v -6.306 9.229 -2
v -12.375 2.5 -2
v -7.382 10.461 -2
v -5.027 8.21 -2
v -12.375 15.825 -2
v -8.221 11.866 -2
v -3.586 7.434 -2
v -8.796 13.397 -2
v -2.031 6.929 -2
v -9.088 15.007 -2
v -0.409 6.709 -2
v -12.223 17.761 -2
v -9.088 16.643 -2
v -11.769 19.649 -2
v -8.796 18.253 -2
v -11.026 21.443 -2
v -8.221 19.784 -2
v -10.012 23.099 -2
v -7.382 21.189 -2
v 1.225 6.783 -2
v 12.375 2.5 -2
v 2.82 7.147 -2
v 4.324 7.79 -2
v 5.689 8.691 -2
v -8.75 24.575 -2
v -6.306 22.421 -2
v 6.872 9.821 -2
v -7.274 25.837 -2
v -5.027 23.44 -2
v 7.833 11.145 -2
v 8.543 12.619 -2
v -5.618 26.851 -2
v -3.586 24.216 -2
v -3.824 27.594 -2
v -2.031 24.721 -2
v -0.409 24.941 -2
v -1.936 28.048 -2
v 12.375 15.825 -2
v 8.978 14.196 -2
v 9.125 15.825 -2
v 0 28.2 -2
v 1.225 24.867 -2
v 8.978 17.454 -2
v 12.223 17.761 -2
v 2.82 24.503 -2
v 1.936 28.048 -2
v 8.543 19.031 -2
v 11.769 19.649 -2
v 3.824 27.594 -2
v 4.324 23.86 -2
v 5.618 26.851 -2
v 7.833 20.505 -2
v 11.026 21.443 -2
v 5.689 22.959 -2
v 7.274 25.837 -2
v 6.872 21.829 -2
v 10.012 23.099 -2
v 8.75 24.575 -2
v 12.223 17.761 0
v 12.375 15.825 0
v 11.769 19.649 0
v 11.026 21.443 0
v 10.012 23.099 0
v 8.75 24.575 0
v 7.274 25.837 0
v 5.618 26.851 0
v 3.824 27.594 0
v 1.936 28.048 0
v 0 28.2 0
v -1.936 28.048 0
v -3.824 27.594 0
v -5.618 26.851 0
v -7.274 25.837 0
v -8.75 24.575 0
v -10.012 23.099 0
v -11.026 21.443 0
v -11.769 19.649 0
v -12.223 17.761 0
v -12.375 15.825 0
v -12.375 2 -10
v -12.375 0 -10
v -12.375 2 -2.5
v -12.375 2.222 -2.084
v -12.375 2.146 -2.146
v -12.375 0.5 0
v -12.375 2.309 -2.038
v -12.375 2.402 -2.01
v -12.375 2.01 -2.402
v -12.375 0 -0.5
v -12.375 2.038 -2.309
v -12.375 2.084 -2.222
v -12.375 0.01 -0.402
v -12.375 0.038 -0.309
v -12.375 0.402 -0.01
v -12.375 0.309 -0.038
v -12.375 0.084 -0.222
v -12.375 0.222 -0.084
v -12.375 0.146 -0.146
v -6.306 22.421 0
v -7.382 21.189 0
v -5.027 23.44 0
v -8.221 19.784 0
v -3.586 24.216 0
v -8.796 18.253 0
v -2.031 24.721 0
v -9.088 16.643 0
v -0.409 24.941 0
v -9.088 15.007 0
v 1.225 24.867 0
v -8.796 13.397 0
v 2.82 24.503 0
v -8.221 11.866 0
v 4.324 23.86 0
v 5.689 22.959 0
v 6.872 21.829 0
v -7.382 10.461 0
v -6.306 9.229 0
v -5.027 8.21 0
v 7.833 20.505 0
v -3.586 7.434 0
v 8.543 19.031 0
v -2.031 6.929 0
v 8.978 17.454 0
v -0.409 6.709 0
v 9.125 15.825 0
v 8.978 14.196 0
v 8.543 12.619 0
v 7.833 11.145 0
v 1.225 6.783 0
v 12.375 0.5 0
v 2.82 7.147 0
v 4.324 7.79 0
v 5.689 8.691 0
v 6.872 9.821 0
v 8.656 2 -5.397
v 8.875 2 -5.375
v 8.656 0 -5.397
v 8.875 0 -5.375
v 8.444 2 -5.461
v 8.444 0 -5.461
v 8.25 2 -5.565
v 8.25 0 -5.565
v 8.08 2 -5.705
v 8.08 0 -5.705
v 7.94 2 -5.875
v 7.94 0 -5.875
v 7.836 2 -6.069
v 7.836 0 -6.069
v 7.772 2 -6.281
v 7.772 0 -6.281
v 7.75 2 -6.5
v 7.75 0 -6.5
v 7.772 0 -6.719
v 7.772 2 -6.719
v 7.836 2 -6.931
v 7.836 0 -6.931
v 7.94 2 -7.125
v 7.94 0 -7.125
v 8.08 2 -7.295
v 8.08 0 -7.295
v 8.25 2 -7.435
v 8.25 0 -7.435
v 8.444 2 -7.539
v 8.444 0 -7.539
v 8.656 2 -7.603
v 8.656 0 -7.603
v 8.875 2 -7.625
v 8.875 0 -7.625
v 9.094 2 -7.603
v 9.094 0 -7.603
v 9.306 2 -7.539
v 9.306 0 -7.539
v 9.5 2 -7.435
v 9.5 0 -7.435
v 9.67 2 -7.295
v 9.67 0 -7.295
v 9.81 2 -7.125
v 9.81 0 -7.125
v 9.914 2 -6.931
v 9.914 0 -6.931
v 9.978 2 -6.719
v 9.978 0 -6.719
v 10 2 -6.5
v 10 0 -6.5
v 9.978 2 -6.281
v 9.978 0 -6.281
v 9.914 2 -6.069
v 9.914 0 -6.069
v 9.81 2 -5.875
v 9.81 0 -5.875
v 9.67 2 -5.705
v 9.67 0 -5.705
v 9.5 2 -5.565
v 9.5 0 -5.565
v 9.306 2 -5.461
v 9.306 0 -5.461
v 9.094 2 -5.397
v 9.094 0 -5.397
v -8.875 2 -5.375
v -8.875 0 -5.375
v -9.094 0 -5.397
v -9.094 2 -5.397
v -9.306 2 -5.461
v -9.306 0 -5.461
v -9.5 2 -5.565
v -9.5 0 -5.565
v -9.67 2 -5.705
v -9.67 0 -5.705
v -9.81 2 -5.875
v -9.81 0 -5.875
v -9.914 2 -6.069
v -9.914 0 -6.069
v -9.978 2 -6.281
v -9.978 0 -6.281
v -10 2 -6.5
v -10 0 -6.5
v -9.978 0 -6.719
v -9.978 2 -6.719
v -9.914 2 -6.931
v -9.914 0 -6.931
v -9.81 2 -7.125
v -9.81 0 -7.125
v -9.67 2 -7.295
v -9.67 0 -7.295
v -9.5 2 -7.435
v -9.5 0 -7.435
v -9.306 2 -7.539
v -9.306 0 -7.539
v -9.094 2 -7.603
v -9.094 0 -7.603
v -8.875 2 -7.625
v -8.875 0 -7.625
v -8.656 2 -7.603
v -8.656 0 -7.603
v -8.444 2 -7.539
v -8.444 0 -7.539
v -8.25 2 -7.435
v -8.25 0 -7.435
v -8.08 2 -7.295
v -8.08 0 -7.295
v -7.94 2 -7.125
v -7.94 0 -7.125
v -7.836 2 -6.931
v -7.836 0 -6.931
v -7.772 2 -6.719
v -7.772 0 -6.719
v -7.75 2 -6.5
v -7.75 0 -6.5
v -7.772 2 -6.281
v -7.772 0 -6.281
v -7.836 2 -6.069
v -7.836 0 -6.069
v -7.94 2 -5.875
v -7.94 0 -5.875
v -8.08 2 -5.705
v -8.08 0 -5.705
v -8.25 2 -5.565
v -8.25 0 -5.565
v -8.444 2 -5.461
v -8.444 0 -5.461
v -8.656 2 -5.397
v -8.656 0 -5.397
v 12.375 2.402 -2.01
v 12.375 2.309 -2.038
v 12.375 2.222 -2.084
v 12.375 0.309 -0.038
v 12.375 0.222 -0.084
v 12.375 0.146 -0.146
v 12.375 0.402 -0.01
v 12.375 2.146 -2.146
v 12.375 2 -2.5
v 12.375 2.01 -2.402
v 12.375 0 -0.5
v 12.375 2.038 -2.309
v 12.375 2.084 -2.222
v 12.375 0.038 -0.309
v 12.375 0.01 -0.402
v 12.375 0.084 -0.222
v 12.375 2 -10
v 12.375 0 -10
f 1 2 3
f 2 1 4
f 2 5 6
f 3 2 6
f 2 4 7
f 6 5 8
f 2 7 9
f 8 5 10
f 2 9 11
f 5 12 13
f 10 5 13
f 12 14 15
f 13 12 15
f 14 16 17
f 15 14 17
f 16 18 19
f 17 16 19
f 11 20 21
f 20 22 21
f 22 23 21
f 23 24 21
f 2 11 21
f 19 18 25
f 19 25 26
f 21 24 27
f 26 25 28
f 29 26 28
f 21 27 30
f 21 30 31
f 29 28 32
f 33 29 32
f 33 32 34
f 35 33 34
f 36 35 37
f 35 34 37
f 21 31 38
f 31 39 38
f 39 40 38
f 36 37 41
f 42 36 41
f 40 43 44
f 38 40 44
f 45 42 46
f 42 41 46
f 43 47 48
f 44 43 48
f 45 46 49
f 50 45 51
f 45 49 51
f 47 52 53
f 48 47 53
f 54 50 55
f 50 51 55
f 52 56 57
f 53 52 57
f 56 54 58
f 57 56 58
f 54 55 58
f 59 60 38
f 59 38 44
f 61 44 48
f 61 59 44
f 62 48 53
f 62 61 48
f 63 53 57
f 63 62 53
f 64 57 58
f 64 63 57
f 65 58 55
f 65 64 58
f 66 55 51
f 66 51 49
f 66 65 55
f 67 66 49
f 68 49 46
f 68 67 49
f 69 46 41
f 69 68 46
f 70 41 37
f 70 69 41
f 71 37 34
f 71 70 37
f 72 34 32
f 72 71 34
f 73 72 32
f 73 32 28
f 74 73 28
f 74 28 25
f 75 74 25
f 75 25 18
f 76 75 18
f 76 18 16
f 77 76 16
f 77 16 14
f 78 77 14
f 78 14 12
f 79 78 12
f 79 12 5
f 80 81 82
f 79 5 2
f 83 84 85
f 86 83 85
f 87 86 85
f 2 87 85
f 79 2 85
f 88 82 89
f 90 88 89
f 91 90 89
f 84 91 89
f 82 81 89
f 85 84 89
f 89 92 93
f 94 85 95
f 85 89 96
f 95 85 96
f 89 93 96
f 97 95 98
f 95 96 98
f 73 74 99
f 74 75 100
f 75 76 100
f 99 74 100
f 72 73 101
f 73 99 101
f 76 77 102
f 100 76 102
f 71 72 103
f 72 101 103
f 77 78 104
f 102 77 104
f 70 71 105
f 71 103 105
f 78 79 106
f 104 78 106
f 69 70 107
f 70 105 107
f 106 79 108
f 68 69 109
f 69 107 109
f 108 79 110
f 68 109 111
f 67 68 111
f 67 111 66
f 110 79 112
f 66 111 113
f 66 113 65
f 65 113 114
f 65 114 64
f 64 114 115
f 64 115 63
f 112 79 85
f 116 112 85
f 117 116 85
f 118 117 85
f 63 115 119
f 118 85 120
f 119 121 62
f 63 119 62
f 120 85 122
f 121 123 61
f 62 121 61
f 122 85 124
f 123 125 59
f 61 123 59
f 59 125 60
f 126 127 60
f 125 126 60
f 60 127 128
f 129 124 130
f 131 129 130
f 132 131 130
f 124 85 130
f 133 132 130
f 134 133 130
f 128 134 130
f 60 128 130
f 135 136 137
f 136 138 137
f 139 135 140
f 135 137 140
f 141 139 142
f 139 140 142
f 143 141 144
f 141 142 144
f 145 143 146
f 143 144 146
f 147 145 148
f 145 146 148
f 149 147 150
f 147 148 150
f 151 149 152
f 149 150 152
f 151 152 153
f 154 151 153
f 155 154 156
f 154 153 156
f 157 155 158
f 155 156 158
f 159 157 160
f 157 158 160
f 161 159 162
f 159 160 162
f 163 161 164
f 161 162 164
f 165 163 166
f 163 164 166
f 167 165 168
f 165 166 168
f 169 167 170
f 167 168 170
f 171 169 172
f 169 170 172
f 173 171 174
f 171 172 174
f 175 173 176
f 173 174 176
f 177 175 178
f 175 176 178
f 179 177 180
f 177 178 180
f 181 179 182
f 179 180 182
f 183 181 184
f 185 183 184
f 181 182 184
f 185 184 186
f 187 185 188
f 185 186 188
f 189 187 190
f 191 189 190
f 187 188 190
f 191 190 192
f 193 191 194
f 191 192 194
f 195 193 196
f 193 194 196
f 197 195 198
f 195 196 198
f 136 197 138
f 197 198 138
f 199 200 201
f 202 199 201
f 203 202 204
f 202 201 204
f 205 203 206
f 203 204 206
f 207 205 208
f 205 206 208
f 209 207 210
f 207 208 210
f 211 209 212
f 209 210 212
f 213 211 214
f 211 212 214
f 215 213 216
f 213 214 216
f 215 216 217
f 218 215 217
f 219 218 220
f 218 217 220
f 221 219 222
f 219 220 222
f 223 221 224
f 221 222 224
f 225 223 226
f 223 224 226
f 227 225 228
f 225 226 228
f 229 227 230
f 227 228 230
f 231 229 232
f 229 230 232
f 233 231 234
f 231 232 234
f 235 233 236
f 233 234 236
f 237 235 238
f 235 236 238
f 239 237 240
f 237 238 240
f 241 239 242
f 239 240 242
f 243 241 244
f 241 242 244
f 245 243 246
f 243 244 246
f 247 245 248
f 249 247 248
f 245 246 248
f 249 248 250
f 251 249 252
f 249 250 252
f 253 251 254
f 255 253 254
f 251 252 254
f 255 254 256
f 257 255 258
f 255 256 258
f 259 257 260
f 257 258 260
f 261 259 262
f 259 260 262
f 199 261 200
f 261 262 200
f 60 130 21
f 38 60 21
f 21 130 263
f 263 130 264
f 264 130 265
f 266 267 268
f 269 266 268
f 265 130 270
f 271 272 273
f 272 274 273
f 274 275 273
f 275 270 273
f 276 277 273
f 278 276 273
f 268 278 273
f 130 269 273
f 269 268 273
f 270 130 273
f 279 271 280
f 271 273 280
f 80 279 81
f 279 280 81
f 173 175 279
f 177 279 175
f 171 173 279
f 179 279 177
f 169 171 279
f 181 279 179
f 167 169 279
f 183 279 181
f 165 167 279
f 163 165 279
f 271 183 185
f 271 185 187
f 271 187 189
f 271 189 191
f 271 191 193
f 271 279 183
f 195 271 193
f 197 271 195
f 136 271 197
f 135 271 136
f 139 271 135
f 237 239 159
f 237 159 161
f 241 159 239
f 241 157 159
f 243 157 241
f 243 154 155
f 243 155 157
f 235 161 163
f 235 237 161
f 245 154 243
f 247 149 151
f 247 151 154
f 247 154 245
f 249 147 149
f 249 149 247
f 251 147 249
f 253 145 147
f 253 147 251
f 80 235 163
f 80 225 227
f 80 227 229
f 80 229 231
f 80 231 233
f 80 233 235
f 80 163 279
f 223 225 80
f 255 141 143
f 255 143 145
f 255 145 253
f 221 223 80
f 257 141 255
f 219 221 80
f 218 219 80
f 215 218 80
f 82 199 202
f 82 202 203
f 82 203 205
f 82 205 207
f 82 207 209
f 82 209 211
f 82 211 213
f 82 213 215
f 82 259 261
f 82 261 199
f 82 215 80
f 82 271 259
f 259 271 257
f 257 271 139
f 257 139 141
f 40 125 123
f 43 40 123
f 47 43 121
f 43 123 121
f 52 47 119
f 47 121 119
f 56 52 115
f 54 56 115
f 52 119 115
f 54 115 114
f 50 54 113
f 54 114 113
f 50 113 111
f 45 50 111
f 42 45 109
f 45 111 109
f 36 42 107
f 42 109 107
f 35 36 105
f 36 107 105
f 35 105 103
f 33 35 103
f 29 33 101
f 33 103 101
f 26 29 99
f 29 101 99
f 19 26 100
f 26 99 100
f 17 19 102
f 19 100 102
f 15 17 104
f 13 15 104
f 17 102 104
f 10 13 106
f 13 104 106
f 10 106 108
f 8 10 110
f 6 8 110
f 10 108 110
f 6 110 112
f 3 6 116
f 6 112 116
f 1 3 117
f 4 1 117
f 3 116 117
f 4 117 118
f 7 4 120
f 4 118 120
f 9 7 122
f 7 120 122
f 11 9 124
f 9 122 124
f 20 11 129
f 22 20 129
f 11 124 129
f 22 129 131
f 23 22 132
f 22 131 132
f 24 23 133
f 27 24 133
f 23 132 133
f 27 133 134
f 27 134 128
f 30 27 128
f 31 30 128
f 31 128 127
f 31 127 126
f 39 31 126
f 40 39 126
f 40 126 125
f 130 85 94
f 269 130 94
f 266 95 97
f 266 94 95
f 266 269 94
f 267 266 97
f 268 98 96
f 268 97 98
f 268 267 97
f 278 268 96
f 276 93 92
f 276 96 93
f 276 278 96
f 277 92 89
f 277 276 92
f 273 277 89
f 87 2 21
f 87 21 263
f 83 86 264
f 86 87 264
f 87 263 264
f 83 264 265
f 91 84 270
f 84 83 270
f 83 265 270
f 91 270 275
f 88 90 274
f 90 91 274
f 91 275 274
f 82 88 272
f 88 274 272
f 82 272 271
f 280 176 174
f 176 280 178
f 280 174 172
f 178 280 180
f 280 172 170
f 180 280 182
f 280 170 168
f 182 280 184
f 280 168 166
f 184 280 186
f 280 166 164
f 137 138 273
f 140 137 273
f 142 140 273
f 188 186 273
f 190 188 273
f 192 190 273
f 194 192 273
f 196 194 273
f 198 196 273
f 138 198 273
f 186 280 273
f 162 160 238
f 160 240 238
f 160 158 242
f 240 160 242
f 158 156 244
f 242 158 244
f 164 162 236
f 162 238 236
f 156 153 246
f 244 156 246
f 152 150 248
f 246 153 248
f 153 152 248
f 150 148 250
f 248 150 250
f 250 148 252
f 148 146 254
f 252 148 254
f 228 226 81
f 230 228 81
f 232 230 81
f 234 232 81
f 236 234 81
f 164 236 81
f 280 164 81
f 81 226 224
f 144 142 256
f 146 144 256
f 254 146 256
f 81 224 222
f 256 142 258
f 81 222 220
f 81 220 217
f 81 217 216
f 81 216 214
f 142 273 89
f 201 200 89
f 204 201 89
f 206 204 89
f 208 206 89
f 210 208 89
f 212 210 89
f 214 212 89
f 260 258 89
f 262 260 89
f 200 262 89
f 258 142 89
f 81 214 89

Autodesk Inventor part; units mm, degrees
ref_plane "YZ Plane" through (0, 0, 0) normal (1, 0, 0) x (0, 1, 0)
ref_plane "XZ Plane" through (0, 0, 0) normal (0, 1, 0) x (-1, 0, 0)
ref_plane "XY Plane" through (0, 0, 0) normal (0, 0, 1) x (1, 0, 0)
sketch "Sketch1" plane through (0, 0, 0) normal (0, 0, 1) x (1, 0, 0)
  circle A0 centre (0, 15.825) radius 9.125
  line L0 (-12.375, 0) -> (12.375, 0)
  arc A1 (12.375, 15.825) -> (-12.375, 15.825) centre (0, 15.825) ccw
  line L1 (12.375, 0) -> (12.375, 15.825)
  line L2 (-12.375, 0) -> (-12.375, 15.825)
  point P0 (0, 0)
  point P1 (0, 0)
  point P2 (0, 0)
  point P3 (0, 3.45)
  dimension "d28" = 18.25
  dimension "d29" = 24.75
  dimension "d30" = 24.75
  dimension "d31" = 3.45
sketch "Sketch2" plane through (0, 0, 0) normal (0, 1, 0) x (-1, 0, 0)
  line L0 (12.375, 0) -> (-12.375, 0)
  line L1 (-12.375, 0) -> (-12.375, -10)
  line L2 (-12.375, -10) -> (12.375, -10)
  line L3 (12.375, -10) -> (12.375, 0)
  point P0 (0, 0)
  point P1 (-12.375, 0)
  dimension "d5" = 24.75
  dimension "d10" = 10
extrude "Extrusion4" add sketch "Sketch2" along normal blind 2
extrude "Extrusion5" add sketch "Sketch1" against normal blind 2
hole "Hole2" at (-8.875, 2, -6.5) direction (0, -1, 0) diameter 2.25 end through all
pattern_linear "Rectangular Pattern2" count 2 spacing 17.75 along (1, 0, 0) of "Hole2"
fillet "Fillet1" radius 0.5 2 edges at (0, 0, 0) (0, 2, -2)
properties part number "DudukanProximity"
